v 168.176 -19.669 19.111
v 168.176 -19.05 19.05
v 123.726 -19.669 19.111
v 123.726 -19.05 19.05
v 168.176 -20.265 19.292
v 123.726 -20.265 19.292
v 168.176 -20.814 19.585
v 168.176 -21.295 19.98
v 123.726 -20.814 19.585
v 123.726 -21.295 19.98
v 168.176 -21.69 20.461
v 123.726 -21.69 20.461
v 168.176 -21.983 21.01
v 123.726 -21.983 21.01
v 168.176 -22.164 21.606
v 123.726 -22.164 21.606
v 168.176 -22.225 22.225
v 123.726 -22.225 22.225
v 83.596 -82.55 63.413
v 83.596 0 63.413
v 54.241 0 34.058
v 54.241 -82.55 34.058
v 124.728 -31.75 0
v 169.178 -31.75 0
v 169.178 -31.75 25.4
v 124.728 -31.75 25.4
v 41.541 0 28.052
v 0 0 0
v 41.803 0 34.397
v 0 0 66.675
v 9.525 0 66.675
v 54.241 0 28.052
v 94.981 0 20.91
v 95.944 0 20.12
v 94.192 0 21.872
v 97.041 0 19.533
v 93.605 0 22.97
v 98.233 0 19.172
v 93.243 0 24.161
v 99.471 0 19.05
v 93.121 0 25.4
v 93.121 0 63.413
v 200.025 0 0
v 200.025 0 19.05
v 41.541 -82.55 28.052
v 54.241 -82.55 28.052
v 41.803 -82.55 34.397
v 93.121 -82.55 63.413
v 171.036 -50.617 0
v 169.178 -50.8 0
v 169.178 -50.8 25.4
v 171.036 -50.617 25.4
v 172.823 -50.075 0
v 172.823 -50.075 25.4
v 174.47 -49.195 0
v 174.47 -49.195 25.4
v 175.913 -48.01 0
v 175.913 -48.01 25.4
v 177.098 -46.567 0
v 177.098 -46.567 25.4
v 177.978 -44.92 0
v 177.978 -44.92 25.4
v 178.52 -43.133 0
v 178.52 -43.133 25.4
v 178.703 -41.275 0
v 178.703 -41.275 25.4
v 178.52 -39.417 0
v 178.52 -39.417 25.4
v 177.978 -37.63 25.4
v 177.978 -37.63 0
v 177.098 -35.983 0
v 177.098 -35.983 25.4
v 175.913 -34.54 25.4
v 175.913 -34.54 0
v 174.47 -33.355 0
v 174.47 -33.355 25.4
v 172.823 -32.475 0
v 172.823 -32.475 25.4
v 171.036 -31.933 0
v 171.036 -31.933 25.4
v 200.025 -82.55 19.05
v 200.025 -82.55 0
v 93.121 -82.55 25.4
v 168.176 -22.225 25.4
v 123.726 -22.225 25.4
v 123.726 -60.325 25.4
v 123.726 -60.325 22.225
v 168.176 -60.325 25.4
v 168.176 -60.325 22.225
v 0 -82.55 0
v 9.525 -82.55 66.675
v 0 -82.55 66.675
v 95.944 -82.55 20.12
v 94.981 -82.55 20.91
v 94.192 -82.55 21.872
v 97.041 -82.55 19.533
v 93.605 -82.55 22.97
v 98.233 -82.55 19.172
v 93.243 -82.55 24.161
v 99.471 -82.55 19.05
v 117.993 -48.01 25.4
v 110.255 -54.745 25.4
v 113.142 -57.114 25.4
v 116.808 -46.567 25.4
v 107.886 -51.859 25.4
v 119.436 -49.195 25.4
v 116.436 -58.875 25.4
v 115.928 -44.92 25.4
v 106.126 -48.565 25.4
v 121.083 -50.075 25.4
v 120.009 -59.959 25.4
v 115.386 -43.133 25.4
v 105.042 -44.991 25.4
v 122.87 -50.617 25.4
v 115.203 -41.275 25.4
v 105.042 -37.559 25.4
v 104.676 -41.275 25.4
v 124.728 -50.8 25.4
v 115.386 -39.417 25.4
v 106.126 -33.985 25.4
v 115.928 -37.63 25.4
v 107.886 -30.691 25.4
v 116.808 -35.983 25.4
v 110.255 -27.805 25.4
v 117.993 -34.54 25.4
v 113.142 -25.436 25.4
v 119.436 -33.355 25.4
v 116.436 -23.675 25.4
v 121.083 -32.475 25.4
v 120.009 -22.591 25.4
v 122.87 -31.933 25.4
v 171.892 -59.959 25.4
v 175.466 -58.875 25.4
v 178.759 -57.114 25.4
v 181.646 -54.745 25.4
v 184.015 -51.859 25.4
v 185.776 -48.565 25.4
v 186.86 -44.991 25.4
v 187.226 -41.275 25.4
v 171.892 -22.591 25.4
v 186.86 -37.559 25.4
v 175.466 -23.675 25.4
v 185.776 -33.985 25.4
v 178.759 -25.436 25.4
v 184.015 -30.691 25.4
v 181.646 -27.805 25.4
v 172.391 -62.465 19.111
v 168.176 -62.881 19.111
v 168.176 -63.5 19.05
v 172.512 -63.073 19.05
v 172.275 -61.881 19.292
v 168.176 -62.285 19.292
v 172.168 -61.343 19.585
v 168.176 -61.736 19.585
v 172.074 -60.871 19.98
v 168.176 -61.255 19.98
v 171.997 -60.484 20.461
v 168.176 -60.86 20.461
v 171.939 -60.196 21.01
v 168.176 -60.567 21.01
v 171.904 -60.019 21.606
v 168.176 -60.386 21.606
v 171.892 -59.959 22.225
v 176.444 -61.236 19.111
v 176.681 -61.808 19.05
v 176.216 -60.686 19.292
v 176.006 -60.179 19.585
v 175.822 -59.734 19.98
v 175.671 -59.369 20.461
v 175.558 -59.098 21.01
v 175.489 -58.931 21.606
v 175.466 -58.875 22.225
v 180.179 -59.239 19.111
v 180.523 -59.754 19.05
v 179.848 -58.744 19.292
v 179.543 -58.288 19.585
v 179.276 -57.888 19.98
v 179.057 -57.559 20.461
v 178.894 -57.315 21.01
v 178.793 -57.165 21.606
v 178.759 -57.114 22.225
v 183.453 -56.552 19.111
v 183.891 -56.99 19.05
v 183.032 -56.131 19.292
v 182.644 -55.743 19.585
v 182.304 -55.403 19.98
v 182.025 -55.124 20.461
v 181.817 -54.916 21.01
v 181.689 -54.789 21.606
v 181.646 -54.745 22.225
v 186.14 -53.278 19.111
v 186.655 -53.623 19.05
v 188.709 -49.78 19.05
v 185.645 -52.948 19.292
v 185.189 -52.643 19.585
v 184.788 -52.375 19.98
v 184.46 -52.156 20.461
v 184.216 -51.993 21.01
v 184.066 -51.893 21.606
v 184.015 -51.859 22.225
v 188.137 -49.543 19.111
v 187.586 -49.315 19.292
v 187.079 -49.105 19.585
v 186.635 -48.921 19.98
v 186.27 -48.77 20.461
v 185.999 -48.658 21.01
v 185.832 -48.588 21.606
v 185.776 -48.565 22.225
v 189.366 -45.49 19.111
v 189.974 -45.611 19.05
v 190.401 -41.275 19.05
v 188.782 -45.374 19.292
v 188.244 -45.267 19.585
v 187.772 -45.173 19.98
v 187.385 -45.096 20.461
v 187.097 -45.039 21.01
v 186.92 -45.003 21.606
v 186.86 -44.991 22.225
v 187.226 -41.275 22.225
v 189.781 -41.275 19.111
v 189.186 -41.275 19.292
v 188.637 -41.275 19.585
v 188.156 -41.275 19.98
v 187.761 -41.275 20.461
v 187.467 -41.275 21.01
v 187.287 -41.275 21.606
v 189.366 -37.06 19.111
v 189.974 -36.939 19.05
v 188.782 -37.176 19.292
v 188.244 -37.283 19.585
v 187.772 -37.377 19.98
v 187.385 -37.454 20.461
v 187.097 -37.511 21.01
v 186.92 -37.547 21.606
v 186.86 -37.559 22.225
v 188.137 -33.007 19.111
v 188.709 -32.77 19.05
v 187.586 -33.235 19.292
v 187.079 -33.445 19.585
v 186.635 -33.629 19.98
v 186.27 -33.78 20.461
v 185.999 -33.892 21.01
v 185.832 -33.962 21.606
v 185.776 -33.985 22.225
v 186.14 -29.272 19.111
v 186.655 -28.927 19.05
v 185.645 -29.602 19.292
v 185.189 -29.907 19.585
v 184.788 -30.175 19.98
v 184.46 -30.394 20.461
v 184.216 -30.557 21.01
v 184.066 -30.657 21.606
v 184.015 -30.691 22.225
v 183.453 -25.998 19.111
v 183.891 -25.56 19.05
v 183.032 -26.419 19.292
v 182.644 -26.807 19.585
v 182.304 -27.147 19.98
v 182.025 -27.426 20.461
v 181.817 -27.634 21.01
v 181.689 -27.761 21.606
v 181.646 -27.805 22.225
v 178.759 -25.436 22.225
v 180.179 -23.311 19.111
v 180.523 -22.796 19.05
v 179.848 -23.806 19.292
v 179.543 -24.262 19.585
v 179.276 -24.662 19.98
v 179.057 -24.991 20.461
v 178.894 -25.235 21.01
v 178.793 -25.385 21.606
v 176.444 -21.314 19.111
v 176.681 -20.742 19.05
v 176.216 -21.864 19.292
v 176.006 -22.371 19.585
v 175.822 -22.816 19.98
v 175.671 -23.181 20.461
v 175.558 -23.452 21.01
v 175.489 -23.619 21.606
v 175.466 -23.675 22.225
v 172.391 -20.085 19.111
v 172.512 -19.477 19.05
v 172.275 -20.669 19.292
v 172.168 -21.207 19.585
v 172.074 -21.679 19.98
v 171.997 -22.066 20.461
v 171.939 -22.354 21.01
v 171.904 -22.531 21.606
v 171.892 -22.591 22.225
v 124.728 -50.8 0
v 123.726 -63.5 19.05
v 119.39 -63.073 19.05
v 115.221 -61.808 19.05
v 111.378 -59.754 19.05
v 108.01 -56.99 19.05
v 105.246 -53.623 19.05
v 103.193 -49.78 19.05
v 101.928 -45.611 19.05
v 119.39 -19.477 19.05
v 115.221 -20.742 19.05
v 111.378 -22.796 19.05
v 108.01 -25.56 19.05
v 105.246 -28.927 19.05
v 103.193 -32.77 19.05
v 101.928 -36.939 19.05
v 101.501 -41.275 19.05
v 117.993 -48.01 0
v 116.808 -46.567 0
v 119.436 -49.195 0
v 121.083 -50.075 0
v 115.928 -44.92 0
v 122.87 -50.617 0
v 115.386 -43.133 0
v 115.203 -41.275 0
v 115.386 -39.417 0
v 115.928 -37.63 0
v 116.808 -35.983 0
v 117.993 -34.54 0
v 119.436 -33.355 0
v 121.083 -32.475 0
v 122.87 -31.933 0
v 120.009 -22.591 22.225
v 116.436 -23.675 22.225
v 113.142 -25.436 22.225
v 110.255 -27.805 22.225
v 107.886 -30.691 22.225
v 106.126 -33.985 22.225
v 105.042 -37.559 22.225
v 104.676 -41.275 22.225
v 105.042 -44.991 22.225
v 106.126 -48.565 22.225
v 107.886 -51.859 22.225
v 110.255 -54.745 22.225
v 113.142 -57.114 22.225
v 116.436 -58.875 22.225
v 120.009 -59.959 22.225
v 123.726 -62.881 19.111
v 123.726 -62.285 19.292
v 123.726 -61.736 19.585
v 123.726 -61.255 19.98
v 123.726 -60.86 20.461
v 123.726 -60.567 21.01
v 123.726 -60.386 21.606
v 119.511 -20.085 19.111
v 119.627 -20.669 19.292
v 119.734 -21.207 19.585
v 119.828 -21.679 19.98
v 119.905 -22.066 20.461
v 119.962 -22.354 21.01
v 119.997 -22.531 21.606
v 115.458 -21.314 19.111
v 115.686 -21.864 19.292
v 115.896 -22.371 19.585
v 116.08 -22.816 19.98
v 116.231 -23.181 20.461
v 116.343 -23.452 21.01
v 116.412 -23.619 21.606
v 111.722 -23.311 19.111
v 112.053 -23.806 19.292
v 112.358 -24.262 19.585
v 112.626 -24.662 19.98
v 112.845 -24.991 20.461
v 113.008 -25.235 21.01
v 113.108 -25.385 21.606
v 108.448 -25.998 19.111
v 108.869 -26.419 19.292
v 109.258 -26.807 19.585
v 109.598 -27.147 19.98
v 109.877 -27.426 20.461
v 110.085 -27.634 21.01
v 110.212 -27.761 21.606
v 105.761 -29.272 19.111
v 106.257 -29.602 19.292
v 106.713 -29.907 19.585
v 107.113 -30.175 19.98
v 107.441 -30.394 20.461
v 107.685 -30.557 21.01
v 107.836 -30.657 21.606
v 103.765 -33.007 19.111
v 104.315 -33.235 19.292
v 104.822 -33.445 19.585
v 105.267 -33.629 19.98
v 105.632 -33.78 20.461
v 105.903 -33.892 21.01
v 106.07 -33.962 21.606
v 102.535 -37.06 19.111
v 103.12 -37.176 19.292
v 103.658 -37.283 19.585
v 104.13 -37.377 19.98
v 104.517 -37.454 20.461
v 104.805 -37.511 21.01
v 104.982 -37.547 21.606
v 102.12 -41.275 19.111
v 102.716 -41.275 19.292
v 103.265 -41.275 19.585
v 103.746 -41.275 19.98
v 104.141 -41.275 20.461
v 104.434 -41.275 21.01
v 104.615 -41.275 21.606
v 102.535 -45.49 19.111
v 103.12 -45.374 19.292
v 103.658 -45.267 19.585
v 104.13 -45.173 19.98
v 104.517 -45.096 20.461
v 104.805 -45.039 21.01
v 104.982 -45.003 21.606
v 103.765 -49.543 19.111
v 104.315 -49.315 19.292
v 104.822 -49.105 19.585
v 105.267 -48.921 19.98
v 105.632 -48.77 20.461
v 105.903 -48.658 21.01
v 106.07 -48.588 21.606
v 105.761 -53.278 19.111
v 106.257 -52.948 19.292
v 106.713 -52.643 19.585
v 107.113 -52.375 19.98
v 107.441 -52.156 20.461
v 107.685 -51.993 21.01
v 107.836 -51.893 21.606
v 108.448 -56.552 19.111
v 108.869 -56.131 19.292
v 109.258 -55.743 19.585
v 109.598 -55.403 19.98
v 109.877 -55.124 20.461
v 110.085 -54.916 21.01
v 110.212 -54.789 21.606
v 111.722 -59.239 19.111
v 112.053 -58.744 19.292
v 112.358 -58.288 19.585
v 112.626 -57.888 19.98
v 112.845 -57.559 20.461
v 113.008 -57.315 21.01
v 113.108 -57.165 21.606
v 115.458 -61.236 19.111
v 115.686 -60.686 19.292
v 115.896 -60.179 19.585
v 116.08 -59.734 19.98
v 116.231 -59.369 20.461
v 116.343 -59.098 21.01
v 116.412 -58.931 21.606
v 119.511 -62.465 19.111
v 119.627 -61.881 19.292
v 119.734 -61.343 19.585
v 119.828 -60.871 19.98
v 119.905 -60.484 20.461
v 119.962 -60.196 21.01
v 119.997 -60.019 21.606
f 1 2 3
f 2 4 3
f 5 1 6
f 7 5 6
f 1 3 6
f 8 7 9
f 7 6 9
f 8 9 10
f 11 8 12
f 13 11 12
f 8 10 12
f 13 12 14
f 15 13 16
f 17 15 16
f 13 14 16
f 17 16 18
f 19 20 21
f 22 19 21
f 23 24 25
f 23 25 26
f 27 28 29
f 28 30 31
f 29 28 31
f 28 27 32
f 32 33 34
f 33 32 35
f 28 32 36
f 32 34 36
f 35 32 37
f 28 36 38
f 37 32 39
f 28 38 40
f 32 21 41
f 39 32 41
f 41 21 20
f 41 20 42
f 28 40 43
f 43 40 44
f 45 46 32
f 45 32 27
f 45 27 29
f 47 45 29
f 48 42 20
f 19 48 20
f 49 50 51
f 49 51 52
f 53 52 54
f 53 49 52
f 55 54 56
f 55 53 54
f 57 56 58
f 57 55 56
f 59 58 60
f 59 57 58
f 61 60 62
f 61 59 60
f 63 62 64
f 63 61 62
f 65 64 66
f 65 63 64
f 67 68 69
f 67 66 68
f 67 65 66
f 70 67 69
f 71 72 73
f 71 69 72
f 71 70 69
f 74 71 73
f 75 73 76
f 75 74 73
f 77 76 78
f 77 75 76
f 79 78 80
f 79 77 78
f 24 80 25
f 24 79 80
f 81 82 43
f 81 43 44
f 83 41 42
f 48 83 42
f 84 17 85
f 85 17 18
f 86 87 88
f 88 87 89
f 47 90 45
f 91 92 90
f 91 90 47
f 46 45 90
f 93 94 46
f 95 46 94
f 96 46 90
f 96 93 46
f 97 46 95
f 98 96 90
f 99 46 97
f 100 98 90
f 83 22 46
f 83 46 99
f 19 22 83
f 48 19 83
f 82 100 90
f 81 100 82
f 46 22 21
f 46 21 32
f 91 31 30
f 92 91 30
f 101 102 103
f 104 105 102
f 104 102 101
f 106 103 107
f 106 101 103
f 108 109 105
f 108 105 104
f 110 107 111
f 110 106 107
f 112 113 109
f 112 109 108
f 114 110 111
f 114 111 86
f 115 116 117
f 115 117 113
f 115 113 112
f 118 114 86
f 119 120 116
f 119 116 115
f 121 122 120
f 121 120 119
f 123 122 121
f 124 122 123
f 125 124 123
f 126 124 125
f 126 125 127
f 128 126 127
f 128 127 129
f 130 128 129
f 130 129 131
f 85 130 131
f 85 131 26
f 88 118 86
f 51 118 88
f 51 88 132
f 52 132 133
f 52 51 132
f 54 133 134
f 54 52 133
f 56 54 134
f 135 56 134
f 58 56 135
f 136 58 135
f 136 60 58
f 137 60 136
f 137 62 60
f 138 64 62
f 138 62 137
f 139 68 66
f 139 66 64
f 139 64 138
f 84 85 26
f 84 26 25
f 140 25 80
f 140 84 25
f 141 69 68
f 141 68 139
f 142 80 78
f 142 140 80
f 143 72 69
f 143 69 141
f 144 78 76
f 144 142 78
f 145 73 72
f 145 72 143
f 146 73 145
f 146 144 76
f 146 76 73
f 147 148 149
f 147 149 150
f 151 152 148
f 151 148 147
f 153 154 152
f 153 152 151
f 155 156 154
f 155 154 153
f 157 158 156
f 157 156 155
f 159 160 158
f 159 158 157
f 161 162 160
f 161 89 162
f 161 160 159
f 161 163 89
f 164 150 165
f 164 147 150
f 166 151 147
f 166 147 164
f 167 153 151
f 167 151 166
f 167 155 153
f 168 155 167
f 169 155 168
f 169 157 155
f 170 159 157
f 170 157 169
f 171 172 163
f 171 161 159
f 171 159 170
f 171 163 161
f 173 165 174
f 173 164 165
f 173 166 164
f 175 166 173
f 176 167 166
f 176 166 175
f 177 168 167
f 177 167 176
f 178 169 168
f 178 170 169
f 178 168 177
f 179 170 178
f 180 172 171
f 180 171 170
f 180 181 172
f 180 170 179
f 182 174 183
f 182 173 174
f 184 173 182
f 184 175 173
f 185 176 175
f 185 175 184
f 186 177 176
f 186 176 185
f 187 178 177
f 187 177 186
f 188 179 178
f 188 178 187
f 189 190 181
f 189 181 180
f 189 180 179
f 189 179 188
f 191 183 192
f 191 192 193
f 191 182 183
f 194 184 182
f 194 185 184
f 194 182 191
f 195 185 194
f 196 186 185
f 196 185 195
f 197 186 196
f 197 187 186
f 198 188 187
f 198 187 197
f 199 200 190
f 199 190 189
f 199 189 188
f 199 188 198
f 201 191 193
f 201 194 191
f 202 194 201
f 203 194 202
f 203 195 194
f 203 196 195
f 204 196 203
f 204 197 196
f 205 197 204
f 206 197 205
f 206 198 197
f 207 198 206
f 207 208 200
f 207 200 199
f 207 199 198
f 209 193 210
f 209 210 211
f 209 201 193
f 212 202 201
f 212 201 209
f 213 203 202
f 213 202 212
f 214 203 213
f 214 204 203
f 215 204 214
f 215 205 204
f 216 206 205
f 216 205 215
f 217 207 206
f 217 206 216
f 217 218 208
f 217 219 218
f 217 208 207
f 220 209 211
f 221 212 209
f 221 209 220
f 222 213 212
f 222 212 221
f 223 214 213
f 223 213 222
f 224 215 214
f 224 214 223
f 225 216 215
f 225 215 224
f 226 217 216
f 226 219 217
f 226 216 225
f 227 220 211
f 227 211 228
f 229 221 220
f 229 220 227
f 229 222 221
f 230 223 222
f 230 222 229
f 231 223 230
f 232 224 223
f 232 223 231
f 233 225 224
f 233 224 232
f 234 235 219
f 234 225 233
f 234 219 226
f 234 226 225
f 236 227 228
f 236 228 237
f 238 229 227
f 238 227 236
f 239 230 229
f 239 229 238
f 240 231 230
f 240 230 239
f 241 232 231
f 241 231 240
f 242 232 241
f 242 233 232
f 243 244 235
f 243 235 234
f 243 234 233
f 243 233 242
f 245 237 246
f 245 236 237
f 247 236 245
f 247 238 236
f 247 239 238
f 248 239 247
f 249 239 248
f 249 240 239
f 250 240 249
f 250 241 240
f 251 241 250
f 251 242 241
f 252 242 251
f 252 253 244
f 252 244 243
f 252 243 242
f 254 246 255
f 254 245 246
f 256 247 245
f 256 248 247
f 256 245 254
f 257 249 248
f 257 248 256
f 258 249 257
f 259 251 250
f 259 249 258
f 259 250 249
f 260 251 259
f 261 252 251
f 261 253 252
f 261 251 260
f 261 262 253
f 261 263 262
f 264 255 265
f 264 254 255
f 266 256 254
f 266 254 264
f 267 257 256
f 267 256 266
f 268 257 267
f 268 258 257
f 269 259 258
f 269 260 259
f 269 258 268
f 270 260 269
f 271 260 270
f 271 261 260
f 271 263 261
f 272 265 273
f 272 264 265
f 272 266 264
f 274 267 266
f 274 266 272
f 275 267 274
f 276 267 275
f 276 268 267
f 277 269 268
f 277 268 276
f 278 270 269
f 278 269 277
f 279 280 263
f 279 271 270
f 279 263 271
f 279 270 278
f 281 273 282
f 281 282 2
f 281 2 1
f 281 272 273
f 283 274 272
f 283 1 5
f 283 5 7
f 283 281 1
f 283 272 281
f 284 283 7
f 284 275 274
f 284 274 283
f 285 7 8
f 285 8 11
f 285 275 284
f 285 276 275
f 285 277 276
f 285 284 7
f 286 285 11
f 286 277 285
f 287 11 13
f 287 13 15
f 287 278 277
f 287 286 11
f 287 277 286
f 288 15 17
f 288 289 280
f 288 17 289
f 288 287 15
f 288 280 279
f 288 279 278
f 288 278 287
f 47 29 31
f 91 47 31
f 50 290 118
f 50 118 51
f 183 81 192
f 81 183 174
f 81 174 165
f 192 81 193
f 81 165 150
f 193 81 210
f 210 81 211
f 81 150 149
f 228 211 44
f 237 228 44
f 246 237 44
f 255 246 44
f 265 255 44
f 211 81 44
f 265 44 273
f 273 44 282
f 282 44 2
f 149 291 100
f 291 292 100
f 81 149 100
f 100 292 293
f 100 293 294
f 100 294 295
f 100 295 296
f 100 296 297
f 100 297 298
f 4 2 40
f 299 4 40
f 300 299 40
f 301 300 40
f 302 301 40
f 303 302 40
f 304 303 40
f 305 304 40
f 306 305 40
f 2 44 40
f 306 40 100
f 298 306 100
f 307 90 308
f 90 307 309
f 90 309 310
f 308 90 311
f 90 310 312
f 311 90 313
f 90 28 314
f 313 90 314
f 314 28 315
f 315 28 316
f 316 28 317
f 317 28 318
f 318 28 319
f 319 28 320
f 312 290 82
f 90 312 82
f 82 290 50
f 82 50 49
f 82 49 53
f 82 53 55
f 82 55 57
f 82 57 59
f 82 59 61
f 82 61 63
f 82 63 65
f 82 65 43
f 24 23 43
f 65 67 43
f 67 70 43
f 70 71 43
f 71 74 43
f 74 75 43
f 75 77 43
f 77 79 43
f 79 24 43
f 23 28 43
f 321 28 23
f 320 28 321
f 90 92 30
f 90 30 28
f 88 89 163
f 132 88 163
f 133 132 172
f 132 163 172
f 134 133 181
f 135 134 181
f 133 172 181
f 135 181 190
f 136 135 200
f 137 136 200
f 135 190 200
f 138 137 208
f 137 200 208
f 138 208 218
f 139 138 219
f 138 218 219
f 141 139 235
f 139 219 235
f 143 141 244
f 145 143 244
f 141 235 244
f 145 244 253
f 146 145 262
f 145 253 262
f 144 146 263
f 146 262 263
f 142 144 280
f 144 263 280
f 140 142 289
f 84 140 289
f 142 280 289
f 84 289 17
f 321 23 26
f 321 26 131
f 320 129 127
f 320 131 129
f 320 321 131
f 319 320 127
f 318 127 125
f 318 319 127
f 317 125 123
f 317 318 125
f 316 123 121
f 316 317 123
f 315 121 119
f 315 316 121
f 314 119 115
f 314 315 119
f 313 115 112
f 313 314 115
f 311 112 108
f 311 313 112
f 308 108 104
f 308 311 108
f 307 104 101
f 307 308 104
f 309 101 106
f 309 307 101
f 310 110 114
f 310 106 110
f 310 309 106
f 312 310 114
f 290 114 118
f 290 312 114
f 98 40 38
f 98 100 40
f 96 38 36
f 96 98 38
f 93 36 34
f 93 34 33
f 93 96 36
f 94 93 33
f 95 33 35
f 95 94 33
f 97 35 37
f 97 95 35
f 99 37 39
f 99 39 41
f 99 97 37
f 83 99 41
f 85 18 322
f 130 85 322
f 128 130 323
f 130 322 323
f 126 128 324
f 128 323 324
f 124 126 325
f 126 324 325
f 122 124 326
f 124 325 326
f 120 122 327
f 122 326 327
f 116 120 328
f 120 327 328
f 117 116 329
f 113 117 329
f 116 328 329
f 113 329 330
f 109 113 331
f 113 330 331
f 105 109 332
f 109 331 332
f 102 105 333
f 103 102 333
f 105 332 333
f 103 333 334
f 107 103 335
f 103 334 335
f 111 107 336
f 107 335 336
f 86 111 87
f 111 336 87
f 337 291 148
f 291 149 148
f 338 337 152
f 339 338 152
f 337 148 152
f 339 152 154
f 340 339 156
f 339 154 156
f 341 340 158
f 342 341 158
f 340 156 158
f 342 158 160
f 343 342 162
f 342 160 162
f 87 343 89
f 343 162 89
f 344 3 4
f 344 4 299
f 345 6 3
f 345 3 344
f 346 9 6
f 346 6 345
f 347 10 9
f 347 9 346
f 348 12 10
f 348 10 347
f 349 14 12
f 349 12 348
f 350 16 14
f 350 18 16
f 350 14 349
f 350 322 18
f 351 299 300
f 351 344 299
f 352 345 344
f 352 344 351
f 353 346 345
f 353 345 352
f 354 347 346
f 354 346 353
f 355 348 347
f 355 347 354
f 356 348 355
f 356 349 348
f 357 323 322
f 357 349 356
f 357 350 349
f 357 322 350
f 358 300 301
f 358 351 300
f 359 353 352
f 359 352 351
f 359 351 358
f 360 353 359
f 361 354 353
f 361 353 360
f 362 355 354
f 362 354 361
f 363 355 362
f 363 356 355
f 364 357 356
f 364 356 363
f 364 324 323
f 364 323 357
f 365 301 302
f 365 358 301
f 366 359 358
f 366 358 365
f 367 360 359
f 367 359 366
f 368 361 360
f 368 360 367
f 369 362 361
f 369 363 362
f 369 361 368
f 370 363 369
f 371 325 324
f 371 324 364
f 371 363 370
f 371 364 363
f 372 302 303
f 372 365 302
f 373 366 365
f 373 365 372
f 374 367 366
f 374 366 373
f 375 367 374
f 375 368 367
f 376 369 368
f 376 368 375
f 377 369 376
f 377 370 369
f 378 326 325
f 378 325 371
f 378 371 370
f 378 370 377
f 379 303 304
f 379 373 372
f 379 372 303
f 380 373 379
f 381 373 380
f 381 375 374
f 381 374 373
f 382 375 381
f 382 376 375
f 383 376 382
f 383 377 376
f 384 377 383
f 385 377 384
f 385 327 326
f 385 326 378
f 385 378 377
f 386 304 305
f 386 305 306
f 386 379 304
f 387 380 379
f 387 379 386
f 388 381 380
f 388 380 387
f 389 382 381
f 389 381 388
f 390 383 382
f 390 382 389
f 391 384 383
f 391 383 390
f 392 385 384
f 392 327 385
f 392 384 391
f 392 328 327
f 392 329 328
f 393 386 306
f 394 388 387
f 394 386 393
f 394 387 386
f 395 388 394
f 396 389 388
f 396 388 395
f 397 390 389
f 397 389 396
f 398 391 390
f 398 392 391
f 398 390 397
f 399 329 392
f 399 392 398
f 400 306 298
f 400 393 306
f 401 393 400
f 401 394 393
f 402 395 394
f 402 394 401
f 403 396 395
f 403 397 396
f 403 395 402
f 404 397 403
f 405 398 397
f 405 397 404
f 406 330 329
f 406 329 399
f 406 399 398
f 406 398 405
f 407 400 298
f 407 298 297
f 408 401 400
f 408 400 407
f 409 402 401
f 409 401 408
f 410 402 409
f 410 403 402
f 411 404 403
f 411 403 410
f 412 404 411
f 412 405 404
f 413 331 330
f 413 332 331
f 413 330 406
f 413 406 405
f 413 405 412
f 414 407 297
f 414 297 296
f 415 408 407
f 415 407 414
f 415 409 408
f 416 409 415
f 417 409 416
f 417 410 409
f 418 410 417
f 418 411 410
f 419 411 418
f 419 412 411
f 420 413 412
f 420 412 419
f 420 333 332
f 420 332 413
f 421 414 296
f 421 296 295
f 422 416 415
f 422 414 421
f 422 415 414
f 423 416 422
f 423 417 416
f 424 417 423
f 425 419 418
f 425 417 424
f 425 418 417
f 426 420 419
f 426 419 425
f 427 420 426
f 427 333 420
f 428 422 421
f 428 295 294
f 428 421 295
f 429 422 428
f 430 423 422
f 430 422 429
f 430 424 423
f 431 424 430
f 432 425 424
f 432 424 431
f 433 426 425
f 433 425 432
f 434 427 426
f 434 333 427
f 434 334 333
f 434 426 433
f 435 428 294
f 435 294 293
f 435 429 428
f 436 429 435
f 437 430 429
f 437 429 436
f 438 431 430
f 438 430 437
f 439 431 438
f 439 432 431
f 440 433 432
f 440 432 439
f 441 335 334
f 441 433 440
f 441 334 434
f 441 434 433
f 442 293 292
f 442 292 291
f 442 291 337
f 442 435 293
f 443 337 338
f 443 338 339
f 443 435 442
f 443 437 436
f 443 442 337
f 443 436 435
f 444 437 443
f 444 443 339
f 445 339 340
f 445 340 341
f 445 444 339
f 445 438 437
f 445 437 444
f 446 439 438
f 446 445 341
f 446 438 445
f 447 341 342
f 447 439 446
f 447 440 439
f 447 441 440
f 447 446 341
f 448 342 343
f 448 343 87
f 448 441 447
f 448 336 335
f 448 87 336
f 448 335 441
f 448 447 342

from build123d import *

# Parameters (mm, degrees)
F1_DEPTH = 82.55
F3_DEPTH = 25.4
F5_DEPTH = 66.676
F6_R     = 3.175
F7_R     = 6.35


with BuildPart() as f1:
    # F0 (on Front) → F1 (new body)
    with BuildSketch(Plane.XZ):
        Polygon((0, 66.675), (0, 0), (200.025, 0), (200.025, 19.05), (93.121408, 19.05), (93.121408, 63.413289), (83.596408, 63.413289), (54.240717, 34.057599), (54.240717, 28.052471), (41.540717, 28.052471), (41.802945, 34.397055), (9.525, 66.675), align=None)
    extrude(amount=F1_DEPTH)

    # F2 (on Top) → F3 (join)
    with BuildSketch(Plane.XY):
        with BuildLine():
            Line((168.175783, -22.225), (123.725783, -22.225))
            ThreePointArc((123.725783, -22.225), (104.675783, -41.275), (123.725783, -60.325))
            Line((123.725783, -60.325), (168.175783, -60.325))
            ThreePointArc((168.175783, -60.325), (187.225783, -41.275), (168.175783, -22.225))
        make_face()
    extrude(amount=F3_DEPTH)

    # F4 (on Top) → F5 (cut, through all)
    with BuildSketch(Plane.XY):
        with BuildLine():
            ThreePointArc((124.727895, -31.75), (115.202895, -41.275), (124.727895, -50.8))
            Line((124.727895, -50.8), (169.177895, -50.8))
            ThreePointArc((169.177895, -50.8), (178.702895, -41.275), (169.177895, -31.75))
            Line((169.177895, -31.75), (124.727895, -31.75))
        make_face()
    extrude(amount=F5_DEPTH, mode=Mode.SUBTRACT)

    # F6
    f6_edges = [f1.edges().sort_by_distance(p)[0] for p in [
        (145.950783, -60.325, 19.05),
    ]]
    fillet(f6_edges, radius=F6_R)

    # F7
    f7_edges = [f1.edges().sort_by_distance(p)[0] for p in [
        (93.121408, -41.275, 19.05),
    ]]
    fillet(f7_edges, radius=F7_R)


solid = f1.part
